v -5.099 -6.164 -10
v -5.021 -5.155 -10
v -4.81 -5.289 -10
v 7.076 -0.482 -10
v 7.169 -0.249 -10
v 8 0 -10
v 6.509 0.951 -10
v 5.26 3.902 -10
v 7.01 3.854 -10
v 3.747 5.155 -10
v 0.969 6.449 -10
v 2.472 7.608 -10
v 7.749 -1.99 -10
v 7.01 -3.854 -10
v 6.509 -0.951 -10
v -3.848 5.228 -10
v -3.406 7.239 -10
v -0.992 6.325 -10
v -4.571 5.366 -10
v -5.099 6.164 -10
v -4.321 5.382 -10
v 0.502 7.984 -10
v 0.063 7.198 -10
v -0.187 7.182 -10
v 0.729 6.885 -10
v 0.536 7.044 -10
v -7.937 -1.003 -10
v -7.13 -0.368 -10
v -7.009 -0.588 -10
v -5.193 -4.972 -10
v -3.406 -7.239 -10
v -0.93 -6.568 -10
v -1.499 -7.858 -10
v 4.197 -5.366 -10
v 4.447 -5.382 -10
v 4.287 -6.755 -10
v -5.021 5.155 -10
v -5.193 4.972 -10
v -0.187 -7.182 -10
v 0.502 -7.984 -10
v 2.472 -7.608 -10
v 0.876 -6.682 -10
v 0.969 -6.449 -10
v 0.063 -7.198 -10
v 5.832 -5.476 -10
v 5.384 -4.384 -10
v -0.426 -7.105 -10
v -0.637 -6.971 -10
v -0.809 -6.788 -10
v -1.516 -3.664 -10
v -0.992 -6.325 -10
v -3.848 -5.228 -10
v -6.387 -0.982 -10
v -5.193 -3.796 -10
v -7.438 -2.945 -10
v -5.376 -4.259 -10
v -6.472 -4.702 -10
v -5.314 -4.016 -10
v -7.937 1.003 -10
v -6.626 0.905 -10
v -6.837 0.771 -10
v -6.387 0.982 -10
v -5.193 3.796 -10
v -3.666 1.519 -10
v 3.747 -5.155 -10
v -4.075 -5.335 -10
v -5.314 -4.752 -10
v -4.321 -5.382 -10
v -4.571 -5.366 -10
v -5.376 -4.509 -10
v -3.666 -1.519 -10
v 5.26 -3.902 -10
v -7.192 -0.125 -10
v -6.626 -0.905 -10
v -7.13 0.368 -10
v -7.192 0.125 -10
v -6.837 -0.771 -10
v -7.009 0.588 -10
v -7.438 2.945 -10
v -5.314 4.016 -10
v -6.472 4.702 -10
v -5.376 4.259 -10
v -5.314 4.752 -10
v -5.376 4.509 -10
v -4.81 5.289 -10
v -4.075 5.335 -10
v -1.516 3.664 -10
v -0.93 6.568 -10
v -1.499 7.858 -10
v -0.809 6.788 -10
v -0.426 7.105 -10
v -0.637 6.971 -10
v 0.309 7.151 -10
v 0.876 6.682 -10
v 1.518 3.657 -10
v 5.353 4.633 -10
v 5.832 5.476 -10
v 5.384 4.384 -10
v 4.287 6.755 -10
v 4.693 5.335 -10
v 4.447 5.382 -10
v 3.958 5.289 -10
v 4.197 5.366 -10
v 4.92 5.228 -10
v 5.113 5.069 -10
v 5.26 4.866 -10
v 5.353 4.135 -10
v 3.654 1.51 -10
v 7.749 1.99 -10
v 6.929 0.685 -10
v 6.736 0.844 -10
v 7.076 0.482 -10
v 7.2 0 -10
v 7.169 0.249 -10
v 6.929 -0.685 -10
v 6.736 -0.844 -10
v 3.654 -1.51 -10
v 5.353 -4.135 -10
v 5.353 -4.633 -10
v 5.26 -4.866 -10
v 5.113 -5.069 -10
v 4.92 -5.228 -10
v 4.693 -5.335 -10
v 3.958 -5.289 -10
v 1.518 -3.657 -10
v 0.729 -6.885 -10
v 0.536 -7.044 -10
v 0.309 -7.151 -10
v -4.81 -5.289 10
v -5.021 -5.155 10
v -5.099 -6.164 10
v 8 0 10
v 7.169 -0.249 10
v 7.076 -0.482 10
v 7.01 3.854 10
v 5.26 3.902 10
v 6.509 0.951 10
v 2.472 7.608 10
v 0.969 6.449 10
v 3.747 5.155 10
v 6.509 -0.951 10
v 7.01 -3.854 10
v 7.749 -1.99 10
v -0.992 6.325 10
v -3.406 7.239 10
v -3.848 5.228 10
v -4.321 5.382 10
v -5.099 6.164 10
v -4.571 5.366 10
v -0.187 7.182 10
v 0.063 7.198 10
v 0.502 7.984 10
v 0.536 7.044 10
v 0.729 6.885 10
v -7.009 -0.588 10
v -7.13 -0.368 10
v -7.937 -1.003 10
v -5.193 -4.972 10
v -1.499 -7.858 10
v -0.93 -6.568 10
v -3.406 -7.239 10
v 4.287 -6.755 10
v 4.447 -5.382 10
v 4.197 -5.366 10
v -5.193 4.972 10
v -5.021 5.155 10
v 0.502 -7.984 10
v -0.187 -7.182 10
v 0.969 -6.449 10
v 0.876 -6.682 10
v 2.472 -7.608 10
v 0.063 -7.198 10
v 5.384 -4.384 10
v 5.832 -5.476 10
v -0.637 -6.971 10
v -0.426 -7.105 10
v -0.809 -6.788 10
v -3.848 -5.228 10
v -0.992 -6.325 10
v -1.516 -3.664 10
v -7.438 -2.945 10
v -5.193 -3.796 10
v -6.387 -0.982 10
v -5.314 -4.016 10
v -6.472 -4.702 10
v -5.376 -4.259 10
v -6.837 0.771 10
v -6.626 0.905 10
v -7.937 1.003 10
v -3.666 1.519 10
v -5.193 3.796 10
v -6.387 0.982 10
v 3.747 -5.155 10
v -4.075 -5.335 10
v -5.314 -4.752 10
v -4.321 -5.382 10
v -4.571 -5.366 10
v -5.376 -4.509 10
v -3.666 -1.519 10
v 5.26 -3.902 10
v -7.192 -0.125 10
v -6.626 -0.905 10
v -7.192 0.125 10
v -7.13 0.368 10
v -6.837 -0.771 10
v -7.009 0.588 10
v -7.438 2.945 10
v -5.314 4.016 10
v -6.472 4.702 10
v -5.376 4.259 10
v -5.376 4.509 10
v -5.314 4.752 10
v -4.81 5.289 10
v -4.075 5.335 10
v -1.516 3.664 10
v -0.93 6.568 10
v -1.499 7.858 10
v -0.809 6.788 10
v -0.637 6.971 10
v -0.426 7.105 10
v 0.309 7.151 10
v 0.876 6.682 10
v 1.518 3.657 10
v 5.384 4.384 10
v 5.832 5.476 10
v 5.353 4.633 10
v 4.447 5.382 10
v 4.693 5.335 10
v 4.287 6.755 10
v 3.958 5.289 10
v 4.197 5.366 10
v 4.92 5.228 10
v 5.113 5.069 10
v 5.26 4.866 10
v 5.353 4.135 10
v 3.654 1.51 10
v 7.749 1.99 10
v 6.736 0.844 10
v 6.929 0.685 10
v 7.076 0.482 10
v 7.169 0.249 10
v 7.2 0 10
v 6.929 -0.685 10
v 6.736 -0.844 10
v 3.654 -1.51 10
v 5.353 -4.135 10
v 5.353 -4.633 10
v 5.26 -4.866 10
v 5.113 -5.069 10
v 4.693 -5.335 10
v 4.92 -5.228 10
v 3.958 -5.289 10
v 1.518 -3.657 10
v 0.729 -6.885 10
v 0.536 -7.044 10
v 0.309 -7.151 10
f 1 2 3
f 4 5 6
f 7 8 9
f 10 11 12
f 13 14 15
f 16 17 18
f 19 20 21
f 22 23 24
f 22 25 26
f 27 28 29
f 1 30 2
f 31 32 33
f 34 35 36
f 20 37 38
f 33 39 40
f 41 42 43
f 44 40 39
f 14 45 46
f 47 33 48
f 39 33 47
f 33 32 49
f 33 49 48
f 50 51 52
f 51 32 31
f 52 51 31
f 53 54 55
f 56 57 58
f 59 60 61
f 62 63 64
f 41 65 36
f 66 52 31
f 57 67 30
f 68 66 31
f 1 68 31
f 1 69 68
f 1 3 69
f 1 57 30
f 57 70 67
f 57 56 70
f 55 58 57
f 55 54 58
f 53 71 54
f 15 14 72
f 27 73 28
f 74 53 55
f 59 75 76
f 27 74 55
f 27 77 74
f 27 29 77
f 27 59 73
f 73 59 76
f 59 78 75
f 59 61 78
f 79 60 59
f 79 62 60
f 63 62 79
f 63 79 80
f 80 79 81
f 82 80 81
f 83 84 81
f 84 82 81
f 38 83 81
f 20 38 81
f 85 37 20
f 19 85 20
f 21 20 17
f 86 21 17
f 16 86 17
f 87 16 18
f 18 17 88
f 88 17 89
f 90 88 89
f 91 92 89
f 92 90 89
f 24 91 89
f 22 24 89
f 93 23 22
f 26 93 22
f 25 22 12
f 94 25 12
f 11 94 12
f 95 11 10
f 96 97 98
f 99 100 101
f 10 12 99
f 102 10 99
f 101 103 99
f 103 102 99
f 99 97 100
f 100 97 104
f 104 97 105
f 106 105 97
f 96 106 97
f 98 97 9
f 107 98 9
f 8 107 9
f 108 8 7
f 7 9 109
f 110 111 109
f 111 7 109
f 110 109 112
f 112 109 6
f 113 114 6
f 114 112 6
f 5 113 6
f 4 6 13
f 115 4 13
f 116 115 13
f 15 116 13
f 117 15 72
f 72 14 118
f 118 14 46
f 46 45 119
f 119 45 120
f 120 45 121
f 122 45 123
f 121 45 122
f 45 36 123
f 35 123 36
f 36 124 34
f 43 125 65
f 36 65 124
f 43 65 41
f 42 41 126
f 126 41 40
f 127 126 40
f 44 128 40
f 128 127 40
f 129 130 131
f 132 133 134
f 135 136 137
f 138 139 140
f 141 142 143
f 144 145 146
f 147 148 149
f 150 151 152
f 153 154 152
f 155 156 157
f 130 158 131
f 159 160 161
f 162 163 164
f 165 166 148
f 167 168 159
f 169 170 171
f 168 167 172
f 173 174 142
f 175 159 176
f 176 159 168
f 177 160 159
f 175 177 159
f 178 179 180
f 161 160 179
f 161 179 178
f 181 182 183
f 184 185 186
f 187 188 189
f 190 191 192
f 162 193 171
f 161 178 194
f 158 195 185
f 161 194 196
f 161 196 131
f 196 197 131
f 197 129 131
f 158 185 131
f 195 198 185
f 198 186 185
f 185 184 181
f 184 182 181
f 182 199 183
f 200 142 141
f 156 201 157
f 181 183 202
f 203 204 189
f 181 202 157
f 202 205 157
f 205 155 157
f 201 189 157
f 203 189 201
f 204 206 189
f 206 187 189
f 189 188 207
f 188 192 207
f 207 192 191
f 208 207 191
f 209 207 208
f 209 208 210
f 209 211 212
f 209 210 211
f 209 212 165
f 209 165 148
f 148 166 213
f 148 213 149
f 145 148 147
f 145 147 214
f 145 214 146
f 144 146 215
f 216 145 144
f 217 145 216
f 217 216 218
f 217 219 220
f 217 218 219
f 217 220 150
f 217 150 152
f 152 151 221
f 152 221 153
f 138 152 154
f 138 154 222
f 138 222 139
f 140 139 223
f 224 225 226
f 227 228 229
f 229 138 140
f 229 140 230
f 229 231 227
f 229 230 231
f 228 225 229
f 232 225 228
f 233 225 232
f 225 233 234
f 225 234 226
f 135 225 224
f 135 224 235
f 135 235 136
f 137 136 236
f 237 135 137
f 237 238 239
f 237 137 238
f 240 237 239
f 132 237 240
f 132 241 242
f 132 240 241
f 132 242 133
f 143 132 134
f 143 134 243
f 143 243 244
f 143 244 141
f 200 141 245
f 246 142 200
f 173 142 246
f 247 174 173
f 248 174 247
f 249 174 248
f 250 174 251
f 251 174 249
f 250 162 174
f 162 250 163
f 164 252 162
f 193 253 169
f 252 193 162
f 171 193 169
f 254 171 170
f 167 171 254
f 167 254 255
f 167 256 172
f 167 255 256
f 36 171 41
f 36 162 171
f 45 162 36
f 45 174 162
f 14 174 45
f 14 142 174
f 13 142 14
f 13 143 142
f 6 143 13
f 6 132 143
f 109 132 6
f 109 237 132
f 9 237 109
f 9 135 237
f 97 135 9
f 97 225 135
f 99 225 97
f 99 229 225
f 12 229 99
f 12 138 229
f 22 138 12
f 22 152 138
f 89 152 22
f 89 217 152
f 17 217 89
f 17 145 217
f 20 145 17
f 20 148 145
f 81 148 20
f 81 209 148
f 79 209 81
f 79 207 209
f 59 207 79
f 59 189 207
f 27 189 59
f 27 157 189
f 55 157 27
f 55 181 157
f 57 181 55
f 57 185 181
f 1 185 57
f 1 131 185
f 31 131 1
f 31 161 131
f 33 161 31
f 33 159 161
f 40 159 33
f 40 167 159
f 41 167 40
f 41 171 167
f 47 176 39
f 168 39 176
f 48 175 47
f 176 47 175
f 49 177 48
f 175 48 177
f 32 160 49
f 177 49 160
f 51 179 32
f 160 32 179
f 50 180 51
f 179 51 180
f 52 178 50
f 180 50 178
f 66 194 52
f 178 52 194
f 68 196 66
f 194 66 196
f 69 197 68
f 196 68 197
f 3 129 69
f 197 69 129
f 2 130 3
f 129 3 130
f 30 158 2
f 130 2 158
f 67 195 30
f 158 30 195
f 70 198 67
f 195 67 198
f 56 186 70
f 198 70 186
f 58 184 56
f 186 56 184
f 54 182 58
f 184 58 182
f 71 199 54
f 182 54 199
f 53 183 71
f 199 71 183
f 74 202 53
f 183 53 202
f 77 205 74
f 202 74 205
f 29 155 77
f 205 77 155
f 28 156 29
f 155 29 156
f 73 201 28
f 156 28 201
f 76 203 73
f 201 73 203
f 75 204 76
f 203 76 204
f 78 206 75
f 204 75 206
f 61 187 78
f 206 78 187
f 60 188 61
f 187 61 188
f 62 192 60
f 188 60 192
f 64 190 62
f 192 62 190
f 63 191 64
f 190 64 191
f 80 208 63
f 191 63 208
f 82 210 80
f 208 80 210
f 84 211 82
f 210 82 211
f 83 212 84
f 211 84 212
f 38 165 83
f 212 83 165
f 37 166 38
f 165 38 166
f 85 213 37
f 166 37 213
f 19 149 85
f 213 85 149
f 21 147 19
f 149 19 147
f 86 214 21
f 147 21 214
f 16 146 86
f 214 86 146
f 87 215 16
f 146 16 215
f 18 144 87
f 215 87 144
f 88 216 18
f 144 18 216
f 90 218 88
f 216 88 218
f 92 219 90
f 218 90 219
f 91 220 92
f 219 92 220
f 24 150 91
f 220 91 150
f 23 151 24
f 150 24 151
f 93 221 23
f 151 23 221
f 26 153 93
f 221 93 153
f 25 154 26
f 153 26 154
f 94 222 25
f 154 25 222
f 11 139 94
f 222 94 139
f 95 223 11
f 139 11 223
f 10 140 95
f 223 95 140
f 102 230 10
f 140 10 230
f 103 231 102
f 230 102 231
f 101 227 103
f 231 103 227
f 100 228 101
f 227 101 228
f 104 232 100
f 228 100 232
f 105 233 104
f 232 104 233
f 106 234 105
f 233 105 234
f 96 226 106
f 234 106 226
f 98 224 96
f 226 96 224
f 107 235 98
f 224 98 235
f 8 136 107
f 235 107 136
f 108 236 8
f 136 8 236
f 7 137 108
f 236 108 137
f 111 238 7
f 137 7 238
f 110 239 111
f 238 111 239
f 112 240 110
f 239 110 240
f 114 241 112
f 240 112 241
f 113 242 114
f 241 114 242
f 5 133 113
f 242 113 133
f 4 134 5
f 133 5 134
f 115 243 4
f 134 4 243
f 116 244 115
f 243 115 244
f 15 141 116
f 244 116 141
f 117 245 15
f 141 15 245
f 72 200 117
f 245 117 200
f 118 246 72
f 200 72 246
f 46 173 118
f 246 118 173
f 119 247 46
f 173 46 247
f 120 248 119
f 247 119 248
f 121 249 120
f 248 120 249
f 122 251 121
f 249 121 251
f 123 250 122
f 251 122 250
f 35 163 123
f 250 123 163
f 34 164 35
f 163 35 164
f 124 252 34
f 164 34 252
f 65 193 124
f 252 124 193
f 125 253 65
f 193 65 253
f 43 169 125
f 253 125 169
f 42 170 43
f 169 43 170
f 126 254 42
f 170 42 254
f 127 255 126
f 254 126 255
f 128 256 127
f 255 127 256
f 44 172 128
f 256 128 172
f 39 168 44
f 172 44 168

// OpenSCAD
$fn=25;
/*
linear_extrude(height=20, center=true)
{
hull() {
translate([6,0,0]) circle(r=1);
circle(r=2);
}
hull() {
translate([-6,0,0]) circle(r=1);
circle(r=2);
}
hull() {
translate([0,6,0]) circle(r=1);
circle(r=2);
}
hull() {
translate([0,-6,0]) circle(r=1);
circle(r=2);
}
hull() {
translate([sin(45)*6,sin(45)*6,0]) circle(r=1);
circle(r=2);
}
hull() {
translate([sin(45)*-6,sin(45)*6,0]) circle(r=1);
circle(r=2);
}
hull() {
translate([sin(45)*6,sin(45)*-6,0]) circle(r=1);
circle(r=2);
}
hull() {
translate([sin(45)*-6,sin(45)*-6,0]) circle(r=1);
circle(r=2);
}
}
*/

linear_extrude(height=20, center=true)
difference() {
circle(r=8);
{
hull() {
translate([6.2,0,0]) circle(r=1);
circle(r=2.2);
}
hull() {
translate([-6.2,0,0]) circle(r=1);
circle(r=2.2);
}
hull() {
translate([0,6.2,0]) circle(r=1);
circle(r=2.2);
}
hull() {
translate([0,-6.2,0]) circle(r=1);
circle(r=2.2);
}
hull() {
translate([sin(45)*6.2,sin(45)*6.2,0]) circle(r=1);
circle(r=2.2);
}
hull() {
translate([sin(45)*-6.2,sin(45)*6.2,0]) circle(r=1);
circle(r=2.2);
}
hull() {
translate([sin(45)*6.2,sin(45)*-6.2,0]) circle(r=1);
circle(r=2.2);
}
hull() {
translate([sin(45)*-6.2,sin(45)*-6.2,0]) circle(r=1);
circle(r=2.2);
}
}
}
